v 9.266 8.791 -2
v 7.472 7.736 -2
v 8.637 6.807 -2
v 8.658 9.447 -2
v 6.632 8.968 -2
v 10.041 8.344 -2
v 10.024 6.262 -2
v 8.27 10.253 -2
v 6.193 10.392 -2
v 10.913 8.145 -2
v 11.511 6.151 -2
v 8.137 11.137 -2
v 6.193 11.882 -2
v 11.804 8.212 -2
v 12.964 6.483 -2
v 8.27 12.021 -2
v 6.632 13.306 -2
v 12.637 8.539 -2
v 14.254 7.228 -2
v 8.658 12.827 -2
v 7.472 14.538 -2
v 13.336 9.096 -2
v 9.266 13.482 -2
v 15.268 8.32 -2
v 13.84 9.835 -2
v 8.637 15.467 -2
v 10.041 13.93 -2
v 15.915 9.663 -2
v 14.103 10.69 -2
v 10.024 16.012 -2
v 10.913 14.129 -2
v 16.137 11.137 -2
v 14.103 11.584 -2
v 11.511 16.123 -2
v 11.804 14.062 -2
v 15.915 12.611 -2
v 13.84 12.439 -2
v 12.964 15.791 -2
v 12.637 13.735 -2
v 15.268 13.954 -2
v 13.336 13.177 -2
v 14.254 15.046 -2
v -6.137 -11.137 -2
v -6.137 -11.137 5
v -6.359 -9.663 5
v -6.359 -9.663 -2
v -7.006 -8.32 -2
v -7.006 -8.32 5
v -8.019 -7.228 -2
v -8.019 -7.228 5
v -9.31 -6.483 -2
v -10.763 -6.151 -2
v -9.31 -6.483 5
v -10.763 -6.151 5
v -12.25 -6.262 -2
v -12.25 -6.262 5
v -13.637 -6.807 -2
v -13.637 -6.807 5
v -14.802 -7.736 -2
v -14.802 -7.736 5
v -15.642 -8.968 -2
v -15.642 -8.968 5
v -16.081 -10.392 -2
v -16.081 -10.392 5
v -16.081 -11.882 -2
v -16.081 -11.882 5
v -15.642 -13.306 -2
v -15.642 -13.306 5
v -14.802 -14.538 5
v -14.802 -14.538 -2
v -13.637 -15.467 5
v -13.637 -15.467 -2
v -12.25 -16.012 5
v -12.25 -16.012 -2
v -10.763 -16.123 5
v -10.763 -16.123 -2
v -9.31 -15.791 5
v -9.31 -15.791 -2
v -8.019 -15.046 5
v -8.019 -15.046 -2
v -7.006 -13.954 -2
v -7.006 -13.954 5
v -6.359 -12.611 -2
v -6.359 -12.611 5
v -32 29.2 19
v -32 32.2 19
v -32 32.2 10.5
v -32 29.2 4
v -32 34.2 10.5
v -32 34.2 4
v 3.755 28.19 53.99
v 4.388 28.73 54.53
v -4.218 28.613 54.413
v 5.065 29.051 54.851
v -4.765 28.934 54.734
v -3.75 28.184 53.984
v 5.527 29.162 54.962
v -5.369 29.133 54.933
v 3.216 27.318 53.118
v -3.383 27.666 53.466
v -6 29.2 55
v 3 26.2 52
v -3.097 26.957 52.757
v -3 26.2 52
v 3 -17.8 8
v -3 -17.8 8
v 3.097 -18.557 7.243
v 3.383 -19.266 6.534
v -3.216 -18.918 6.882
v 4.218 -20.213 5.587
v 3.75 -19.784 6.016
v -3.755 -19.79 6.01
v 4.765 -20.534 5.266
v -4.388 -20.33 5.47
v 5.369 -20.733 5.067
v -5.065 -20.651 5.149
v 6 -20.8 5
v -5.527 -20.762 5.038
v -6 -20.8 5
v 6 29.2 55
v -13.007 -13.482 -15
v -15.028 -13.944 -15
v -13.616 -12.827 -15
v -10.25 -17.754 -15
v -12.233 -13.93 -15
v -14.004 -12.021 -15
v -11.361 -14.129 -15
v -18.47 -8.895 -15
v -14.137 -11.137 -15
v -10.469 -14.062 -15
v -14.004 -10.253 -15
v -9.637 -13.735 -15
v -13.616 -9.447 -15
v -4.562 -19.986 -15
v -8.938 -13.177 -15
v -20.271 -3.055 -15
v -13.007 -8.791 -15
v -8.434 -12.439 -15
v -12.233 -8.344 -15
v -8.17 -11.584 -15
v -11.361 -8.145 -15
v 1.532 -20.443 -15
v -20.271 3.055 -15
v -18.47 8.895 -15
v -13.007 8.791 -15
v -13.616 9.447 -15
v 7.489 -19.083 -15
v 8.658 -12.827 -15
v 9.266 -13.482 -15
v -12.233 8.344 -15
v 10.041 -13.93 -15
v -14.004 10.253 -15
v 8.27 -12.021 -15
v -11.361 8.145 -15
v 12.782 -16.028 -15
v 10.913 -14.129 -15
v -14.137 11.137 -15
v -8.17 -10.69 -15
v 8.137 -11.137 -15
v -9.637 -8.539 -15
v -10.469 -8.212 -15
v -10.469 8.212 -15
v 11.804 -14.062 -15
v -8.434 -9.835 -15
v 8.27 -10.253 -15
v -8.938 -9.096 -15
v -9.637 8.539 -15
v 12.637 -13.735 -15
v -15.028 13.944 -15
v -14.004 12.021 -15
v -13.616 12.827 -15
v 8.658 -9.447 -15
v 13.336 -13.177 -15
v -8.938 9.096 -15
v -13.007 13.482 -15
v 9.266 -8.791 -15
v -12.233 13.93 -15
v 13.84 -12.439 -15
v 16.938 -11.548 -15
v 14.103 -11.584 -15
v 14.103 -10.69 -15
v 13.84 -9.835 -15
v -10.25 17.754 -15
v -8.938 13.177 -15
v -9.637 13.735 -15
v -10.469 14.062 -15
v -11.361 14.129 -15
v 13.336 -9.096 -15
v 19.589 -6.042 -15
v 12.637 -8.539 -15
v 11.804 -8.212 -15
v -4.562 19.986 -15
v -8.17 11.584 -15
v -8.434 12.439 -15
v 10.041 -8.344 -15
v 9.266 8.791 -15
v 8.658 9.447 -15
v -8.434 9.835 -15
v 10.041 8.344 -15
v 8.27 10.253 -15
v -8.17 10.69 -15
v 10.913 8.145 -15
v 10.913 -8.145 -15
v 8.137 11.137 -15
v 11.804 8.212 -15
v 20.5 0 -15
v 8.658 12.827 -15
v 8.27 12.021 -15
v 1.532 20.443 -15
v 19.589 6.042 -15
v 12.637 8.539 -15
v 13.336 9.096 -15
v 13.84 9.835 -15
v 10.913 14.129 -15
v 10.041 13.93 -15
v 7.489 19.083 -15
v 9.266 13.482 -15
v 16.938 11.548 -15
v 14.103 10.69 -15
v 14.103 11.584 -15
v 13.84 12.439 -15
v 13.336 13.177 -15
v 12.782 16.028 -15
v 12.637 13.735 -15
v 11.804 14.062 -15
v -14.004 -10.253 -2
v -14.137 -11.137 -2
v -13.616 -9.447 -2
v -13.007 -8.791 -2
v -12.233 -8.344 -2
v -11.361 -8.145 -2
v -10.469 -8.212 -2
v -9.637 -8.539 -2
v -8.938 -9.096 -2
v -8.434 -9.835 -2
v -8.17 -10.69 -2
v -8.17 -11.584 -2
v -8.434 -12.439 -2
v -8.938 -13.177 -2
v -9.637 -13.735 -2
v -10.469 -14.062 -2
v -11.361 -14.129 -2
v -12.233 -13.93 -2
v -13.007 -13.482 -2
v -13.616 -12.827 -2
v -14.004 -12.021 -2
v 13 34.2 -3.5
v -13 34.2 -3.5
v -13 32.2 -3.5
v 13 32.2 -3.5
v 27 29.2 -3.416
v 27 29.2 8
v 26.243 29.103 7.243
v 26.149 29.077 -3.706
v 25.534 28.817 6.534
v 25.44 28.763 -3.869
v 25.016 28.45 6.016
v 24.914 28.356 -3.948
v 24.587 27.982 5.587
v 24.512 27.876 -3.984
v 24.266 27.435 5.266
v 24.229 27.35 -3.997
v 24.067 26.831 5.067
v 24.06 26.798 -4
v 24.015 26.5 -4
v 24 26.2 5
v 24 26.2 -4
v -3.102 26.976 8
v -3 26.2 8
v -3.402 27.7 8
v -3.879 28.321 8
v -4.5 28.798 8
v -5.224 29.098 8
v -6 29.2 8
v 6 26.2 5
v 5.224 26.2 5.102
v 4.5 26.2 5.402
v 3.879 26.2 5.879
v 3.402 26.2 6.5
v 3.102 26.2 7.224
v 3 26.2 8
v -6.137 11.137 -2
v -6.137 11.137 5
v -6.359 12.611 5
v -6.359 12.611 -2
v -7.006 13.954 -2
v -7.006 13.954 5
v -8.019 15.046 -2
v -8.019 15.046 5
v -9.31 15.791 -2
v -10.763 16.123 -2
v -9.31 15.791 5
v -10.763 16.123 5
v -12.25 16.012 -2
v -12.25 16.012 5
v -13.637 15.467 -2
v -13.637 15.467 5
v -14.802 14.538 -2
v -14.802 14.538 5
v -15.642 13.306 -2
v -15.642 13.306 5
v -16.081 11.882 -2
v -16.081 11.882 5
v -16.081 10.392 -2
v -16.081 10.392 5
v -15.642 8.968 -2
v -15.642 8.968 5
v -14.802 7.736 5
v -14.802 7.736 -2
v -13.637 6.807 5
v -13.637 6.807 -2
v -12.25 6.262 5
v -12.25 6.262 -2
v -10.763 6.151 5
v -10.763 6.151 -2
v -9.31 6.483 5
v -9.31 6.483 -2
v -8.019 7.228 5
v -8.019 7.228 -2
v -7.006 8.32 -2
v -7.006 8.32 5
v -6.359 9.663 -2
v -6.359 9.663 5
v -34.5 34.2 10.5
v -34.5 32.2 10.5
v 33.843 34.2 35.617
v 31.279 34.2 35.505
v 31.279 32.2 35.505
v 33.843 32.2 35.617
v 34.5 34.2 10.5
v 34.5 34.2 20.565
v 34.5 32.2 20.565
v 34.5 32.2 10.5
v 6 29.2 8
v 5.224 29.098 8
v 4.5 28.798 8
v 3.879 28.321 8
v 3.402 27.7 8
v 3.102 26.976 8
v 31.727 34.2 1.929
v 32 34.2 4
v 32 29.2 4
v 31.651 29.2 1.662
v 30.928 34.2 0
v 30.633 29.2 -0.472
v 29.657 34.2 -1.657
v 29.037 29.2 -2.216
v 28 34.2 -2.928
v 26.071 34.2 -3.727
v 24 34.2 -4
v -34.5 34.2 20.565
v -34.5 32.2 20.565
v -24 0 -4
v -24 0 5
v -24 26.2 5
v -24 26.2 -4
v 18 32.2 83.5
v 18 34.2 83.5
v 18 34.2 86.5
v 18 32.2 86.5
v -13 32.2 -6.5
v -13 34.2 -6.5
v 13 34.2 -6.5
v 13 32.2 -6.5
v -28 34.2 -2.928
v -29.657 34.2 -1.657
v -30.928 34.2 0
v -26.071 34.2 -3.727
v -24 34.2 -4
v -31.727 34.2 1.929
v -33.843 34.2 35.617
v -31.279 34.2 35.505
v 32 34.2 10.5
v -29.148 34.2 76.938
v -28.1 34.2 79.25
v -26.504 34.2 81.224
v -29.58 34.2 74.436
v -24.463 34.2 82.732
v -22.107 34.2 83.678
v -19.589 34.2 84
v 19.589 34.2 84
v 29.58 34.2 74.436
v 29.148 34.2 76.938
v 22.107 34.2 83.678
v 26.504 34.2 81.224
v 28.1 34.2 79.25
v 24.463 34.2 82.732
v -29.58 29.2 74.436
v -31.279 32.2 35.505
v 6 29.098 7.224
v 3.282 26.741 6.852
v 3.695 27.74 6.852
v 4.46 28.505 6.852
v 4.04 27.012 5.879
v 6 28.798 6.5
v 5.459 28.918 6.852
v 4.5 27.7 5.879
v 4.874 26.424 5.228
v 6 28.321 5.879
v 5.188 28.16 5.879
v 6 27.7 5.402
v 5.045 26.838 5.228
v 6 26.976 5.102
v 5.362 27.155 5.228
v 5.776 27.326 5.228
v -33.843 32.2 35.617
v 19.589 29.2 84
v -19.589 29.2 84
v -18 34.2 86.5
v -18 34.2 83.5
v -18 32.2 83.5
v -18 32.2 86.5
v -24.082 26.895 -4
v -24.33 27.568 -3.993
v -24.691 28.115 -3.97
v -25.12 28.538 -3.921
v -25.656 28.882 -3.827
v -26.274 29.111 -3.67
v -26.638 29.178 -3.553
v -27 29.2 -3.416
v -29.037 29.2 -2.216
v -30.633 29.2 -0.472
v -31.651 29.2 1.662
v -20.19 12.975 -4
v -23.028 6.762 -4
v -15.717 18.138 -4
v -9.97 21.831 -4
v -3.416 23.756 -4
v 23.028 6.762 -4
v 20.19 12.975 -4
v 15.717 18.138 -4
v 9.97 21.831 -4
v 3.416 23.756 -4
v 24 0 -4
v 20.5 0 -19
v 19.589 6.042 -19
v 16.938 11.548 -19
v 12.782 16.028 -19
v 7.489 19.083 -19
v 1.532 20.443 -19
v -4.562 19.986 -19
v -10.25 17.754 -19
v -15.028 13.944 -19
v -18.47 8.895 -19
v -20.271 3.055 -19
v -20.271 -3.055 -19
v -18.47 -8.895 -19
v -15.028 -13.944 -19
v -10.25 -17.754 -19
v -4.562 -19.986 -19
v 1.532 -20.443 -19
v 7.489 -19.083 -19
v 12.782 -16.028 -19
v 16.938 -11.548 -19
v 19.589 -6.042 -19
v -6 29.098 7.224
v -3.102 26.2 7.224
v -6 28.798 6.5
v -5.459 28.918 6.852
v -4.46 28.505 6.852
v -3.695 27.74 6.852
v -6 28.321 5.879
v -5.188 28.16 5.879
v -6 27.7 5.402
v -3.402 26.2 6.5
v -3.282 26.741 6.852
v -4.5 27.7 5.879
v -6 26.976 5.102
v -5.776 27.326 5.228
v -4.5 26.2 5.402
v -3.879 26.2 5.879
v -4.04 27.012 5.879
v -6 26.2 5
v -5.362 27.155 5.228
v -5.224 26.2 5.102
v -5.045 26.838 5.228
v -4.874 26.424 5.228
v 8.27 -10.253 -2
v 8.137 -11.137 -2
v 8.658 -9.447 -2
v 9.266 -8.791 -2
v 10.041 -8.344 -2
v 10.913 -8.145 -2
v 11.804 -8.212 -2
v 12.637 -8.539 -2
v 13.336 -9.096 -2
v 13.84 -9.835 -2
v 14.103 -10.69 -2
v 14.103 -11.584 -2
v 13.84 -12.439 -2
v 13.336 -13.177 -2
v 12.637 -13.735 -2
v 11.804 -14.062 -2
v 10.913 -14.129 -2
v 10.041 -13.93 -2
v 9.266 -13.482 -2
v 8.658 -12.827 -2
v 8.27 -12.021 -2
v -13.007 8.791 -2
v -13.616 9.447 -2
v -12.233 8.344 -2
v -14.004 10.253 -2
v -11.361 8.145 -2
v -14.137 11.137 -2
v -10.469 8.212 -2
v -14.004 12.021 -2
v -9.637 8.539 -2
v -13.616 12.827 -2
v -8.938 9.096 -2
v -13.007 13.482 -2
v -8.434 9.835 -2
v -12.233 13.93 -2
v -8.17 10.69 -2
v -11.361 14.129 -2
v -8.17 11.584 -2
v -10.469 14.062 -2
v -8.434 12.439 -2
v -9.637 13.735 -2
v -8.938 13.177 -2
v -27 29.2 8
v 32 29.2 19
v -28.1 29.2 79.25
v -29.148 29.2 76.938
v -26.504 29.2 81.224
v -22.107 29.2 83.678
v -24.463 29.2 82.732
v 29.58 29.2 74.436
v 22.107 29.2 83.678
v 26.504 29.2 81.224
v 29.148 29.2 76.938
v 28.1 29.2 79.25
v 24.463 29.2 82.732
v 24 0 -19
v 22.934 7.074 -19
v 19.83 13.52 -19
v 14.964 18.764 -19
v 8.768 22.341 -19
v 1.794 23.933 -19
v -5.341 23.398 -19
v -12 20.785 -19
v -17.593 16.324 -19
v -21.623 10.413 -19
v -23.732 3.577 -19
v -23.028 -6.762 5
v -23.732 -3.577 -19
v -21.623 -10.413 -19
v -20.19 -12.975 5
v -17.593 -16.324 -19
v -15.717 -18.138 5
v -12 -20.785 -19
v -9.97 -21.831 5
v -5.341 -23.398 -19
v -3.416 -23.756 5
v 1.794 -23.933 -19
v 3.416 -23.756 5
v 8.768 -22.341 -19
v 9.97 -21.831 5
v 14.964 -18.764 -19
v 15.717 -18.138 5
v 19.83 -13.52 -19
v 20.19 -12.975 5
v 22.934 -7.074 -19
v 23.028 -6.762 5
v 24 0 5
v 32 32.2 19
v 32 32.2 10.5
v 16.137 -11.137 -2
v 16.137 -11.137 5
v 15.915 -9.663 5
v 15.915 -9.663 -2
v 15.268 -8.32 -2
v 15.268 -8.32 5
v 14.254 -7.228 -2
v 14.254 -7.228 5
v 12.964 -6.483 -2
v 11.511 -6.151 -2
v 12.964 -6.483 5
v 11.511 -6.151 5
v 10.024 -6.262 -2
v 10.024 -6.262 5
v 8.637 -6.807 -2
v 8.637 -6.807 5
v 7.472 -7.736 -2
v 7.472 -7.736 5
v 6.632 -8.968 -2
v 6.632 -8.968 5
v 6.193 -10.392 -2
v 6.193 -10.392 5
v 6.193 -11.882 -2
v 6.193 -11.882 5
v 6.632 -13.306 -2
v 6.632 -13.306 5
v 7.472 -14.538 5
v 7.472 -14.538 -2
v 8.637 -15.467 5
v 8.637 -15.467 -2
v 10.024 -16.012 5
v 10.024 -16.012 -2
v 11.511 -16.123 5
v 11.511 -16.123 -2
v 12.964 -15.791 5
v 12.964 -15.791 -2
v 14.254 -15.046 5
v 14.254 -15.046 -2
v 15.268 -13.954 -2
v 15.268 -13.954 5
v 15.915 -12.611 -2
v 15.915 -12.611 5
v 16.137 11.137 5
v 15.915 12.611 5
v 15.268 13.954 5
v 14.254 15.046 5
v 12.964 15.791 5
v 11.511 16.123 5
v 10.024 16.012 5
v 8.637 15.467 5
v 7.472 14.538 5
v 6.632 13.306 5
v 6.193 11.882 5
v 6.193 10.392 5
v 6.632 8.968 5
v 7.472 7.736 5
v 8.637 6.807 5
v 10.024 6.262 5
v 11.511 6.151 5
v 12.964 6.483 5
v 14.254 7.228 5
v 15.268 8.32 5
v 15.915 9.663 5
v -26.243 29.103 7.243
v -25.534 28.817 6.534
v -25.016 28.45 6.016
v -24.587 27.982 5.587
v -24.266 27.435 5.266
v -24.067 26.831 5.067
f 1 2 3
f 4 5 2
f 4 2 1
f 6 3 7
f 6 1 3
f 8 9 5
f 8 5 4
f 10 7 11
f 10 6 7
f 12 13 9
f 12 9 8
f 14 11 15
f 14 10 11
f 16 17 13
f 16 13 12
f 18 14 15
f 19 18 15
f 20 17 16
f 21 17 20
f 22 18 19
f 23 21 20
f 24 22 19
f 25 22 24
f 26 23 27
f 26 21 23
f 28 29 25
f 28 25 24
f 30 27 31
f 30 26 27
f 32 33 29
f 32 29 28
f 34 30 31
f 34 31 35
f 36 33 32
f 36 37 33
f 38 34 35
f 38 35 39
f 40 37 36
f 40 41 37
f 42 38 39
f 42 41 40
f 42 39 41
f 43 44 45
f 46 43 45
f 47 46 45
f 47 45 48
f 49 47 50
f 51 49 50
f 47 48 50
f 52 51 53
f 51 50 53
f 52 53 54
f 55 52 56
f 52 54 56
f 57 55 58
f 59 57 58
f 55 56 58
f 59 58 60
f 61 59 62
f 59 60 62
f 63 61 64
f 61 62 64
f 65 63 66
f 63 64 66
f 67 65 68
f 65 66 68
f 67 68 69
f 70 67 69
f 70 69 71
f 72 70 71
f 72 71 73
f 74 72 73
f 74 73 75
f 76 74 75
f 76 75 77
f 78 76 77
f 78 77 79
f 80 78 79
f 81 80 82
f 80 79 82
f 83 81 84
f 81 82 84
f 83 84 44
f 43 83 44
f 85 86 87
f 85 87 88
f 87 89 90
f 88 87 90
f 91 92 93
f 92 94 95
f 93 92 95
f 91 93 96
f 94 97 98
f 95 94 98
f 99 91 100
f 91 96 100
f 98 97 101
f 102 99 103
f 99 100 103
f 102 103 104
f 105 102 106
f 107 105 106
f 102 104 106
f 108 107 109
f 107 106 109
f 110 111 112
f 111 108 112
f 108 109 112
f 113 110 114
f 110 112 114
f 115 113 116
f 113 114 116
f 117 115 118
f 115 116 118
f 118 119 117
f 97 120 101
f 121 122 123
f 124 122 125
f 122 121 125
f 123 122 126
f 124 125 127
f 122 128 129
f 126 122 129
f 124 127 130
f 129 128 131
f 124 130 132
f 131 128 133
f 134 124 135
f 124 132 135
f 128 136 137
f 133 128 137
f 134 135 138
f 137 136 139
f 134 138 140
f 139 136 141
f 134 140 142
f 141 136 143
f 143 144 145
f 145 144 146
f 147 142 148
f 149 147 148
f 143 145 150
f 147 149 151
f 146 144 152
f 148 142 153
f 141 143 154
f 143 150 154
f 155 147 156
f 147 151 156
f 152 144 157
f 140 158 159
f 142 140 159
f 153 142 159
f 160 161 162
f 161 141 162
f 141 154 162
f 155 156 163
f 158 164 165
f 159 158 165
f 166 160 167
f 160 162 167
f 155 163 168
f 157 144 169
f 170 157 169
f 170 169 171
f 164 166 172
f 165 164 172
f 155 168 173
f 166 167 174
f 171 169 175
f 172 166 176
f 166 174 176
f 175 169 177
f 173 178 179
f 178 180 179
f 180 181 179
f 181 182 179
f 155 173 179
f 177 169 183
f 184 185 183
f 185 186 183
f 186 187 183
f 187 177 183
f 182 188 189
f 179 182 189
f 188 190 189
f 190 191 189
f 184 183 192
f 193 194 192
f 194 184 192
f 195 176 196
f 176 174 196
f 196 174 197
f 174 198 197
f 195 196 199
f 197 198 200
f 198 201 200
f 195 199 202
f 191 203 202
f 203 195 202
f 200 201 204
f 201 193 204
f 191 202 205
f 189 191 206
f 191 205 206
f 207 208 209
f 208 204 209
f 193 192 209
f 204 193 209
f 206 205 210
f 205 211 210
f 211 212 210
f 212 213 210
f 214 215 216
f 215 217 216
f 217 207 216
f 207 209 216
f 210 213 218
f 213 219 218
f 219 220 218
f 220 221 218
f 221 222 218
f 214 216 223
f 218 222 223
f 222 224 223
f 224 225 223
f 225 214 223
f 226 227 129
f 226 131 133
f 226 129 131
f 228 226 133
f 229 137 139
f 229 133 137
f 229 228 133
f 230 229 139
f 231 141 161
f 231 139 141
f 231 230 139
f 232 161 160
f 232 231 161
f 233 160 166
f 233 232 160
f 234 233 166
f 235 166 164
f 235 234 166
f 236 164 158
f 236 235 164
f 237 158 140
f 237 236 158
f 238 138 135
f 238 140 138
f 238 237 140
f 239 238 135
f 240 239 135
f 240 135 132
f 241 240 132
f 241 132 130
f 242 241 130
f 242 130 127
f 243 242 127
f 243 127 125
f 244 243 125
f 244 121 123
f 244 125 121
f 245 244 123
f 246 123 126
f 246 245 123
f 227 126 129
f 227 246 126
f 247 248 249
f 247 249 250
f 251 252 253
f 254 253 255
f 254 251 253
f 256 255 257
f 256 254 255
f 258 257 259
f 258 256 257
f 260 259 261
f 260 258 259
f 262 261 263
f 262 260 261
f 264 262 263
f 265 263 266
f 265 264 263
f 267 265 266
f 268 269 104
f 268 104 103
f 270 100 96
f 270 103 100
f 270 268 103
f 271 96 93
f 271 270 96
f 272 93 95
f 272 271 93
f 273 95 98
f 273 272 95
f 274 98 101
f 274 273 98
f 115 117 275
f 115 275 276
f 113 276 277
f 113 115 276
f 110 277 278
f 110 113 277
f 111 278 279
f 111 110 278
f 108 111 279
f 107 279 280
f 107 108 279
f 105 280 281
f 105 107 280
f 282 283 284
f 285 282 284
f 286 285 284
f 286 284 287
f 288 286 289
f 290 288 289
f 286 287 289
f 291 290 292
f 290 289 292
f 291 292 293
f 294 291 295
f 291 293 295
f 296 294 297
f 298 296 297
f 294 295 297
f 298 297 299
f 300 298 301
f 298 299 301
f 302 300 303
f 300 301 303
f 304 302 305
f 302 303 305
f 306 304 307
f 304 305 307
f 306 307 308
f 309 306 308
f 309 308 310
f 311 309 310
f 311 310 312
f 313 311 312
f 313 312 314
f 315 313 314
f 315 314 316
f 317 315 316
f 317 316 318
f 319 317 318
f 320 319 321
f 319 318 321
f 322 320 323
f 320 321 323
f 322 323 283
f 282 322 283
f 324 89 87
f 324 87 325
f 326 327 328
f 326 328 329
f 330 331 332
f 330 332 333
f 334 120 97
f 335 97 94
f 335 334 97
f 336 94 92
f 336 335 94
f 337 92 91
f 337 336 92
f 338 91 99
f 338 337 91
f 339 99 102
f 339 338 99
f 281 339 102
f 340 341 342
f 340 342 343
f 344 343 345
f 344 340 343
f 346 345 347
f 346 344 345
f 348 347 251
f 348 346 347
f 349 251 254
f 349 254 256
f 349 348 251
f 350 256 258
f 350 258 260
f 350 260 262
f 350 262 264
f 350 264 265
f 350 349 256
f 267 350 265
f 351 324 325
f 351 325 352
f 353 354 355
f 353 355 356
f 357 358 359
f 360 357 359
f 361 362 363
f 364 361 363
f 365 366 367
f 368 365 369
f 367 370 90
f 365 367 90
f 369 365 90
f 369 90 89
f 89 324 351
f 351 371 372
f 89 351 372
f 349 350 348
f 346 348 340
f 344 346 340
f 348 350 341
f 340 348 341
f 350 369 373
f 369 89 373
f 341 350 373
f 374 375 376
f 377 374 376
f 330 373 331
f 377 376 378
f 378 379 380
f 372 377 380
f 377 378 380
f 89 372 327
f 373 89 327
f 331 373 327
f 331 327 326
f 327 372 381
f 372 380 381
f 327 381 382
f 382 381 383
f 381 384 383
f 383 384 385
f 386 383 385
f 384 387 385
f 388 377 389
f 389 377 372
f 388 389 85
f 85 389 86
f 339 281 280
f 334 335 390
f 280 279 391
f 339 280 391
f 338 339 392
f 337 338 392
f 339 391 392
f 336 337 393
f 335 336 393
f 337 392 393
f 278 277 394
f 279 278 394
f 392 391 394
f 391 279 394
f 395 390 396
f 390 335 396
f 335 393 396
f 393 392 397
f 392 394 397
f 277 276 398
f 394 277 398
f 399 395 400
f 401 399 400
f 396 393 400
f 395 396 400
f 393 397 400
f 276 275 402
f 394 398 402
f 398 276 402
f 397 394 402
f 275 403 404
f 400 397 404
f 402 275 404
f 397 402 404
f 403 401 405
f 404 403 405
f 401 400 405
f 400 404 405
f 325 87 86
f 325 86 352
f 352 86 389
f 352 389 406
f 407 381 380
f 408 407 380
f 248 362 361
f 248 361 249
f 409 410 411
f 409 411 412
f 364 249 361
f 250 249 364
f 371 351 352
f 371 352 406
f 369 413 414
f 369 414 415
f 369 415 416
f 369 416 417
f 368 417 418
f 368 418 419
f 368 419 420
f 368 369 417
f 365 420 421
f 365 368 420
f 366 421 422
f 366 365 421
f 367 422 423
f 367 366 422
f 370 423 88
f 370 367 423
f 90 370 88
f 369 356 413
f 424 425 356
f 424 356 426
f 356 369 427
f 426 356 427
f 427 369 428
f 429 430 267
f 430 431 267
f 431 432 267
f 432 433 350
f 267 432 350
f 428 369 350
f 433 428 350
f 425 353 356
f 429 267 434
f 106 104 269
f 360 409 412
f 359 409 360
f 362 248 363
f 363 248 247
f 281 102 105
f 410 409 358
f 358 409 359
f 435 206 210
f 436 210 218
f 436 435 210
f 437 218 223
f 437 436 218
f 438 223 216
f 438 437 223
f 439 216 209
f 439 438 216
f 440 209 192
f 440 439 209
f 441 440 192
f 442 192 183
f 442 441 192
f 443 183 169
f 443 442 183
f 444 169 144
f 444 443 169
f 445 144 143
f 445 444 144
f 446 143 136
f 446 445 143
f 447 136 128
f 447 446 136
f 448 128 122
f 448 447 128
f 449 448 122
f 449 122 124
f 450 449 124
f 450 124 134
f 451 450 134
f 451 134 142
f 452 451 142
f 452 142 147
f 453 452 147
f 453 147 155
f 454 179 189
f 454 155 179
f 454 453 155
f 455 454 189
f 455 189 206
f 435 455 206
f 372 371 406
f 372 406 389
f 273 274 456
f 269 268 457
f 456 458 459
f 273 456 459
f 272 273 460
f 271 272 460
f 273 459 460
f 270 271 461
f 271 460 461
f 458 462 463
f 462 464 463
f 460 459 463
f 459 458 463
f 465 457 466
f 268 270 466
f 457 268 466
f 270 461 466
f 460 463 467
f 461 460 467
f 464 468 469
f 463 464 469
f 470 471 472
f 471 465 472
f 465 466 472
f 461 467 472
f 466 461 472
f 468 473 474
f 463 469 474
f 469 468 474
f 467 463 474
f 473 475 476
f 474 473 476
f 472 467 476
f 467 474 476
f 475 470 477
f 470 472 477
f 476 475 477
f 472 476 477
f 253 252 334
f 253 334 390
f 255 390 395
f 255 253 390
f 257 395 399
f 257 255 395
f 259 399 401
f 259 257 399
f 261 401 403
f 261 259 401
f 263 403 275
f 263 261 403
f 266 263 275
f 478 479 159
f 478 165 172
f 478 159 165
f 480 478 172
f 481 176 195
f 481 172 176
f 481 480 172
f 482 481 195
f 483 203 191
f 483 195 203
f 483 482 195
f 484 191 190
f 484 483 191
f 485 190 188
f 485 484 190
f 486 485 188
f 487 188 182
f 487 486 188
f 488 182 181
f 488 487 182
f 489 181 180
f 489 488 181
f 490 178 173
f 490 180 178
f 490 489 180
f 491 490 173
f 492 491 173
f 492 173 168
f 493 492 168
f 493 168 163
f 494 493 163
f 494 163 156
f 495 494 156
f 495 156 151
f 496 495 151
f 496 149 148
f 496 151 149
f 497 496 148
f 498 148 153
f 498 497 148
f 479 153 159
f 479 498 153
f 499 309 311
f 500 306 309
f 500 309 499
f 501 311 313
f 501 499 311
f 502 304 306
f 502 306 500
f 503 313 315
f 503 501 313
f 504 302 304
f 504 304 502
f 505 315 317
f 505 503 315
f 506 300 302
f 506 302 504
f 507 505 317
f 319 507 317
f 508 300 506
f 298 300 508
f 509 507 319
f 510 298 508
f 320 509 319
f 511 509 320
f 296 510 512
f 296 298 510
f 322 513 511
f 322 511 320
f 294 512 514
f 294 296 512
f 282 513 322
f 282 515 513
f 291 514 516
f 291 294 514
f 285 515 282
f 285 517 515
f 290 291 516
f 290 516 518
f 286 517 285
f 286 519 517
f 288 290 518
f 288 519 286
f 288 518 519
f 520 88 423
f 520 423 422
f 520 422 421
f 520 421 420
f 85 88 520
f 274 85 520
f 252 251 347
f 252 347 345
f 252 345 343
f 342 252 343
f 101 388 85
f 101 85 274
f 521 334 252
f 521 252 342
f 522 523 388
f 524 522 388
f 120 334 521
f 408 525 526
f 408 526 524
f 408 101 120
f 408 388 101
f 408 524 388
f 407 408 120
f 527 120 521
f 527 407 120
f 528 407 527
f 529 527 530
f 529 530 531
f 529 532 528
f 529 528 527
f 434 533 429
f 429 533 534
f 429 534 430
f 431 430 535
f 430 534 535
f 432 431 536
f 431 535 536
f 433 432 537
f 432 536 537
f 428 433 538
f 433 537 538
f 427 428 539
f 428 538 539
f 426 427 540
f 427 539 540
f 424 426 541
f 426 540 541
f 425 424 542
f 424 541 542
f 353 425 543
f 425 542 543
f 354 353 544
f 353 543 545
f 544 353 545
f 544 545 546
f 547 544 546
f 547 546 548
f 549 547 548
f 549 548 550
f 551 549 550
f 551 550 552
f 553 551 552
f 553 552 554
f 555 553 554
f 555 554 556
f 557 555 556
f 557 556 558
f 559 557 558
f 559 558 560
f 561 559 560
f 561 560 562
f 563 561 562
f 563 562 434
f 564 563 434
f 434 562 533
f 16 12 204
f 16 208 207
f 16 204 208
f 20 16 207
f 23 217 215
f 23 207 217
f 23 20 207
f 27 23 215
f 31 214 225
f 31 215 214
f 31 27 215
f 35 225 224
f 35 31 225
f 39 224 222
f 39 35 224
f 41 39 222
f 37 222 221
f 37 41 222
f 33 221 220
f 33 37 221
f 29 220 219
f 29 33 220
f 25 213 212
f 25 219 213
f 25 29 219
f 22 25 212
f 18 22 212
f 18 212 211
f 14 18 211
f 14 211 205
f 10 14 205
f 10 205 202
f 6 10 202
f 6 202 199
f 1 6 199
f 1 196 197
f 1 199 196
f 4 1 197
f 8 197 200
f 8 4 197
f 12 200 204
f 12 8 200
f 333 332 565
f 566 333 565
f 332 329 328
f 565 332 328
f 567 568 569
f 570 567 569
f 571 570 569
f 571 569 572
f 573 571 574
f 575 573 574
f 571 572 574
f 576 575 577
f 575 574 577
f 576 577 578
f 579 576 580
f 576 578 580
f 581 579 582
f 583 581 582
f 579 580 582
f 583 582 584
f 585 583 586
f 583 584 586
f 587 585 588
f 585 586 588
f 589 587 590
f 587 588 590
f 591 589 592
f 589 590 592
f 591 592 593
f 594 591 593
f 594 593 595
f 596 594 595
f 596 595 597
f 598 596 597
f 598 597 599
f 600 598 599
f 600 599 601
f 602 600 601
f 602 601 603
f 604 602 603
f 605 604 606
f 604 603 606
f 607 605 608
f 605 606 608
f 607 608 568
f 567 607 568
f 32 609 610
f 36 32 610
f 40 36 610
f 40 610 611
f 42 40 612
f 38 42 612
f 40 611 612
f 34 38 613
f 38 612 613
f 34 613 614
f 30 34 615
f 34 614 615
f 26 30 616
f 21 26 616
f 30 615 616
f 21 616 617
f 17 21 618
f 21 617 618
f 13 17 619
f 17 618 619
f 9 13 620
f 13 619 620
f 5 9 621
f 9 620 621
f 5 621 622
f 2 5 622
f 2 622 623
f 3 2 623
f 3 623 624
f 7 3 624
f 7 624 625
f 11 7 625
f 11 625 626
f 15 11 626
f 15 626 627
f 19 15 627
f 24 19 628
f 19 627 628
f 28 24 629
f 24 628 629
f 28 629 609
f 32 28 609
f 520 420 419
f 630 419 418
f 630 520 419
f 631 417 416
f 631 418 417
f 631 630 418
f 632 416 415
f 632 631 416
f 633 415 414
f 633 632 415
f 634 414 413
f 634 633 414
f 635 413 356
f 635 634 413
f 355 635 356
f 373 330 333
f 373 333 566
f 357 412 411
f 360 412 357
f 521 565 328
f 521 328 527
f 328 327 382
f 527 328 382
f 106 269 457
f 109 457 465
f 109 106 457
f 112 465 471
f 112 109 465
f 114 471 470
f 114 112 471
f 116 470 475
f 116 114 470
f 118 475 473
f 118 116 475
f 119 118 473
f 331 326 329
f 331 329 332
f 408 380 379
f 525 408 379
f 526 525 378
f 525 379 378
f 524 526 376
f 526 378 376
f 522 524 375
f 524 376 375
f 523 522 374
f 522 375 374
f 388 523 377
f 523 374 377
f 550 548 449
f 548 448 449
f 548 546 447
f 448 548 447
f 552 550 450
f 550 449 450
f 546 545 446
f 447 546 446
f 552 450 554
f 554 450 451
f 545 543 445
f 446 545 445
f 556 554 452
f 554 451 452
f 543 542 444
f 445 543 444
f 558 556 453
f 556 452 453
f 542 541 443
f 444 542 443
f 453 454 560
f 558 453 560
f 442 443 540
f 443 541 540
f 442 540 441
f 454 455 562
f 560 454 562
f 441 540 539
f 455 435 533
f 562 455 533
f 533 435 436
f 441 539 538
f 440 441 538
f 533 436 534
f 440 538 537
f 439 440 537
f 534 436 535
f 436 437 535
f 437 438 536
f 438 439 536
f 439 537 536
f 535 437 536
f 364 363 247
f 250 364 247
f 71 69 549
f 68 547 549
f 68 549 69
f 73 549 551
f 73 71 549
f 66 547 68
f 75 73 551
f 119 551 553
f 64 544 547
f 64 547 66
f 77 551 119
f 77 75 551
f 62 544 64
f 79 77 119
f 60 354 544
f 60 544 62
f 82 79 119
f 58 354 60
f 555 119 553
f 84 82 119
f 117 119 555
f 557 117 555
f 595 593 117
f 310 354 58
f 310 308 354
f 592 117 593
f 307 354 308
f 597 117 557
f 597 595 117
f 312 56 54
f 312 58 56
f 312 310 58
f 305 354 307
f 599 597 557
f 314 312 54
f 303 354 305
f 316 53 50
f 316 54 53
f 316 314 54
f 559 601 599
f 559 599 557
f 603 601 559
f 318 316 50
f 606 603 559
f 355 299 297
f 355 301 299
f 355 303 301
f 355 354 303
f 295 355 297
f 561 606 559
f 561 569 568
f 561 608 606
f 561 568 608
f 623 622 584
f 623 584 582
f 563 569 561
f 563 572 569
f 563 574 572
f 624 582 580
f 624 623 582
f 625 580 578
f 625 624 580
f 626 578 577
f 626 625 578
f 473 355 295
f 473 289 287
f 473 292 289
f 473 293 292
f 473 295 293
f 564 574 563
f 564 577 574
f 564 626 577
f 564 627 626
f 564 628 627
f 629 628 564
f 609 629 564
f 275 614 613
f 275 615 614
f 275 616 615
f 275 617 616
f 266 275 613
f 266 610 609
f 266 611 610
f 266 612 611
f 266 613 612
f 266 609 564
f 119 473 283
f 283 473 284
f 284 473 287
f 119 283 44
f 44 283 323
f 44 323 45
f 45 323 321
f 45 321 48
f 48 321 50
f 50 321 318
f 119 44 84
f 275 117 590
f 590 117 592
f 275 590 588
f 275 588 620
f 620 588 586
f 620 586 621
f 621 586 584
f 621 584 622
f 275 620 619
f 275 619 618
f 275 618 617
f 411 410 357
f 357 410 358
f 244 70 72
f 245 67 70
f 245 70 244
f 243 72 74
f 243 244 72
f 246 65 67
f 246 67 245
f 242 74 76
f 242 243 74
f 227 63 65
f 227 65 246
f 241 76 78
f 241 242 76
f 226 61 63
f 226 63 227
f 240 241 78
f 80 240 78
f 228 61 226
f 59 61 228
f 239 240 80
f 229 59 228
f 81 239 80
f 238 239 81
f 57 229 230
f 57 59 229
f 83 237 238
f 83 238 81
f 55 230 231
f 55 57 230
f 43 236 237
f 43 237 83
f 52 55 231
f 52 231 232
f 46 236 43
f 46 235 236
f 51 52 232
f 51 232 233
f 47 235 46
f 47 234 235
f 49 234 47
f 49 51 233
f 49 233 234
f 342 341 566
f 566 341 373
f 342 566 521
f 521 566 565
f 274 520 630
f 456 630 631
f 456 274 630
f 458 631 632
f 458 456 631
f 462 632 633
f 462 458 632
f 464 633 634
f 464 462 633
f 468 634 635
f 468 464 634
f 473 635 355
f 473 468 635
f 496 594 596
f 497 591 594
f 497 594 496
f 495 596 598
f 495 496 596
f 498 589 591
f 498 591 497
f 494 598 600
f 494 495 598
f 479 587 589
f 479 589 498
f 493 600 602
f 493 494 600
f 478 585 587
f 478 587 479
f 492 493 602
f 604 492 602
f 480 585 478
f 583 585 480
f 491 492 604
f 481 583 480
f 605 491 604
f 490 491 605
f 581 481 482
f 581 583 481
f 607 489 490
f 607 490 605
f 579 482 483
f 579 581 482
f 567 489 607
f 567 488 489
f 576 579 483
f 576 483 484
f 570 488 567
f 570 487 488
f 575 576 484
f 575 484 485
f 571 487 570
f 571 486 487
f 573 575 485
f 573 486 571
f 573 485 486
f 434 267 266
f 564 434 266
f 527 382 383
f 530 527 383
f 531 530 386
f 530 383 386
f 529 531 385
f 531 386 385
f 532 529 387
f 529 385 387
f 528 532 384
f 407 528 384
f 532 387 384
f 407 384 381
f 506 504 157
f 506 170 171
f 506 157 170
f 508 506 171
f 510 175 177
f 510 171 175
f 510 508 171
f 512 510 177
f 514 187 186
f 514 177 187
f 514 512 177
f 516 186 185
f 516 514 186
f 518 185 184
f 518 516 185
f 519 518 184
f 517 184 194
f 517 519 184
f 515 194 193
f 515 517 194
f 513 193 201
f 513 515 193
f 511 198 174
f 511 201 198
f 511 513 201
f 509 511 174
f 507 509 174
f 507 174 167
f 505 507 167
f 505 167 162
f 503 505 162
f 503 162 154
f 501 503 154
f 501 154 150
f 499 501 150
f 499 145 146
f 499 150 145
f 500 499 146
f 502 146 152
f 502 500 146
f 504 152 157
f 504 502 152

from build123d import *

# Parameters (mm, degrees)
BOSS_EXTRUDE3_DEPTH      = 5
BOSS_EXTRUDE3_DEPTH_BACK = 15
SKETCH1_R                = 24
SKETCH1_R_2              = 20.5
BOSS_EXTRUDE4_DEPTH      = 5
BOSS_EXTRUDE4_DEPTH_BACK = 19
SKETCH1_5_R              = 24
SKETCH1_5_R_2            = 20.5
CUT_EXTRUDE1_DEPTH       = 40.395431207
CUT_EXTRUDE1_DEPTH_BACK  = 40.395431207
SKETCH3_R                = 3
SKETCH7_W                = 36
SKETCH7_H                = 3
BOSS_EXTRUDE6_DEPTH      = 2
SKETCH7_W_2              = 26
BOSS_EXTRUDE6_2_DEPTH    = 2
BOSS_EXTRUDE6_3_DEPTH    = 2
BOSS_EXTRUDE6_4_DEPTH    = 2
BOSS_EXTRUDE7_DEPTH      = 5
BOSS_EXTRUDE8_REACH      = 109.251
BOSS_EXTRUDE8_END_RADIUS = 24
SKETCH8_W                = 48
SKETCH8_H                = 9
BOSS_EXTRUDE9_DEPTH      = 3
BOSS_EXTRUDE9_DEPTH_BACK = 3
FILLET1_R                = 3
SKETCH11_R               = 5
CUT_EXTRUDE3_DEPTH       = 7


with BuildPart() as part:
    # Sketch1 → Boss-Extrude3 (new, two sides: drawn at the far end of the back side and taken through both)
    # profile 1 of 2: a face of its own
    with BuildSketch(Plane.XY.offset(-BOSS_EXTRUDE3_DEPTH_BACK)):
        Circle(SKETCH1_R)
        Circle(SKETCH1_R_2, mode=Mode.SUBTRACT)
    # profile 2 of 2: a face of its own
    with BuildSketch(Plane.XY.offset(-BOSS_EXTRUDE3_DEPTH_BACK)):
        Circle(SKETCH1_R_2)
    extrude(amount=BOSS_EXTRUDE3_DEPTH + BOSS_EXTRUDE3_DEPTH_BACK)

    # Sketch1<5> → Boss-Extrude4 (add, two sides: drawn at the far end of the back side and taken through both)
    with BuildSketch(Plane.XY.offset(-BOSS_EXTRUDE4_DEPTH_BACK)):
        Circle(SKETCH1_5_R)
        Circle(SKETCH1_5_R_2, mode=Mode.SUBTRACT)
    extrude(amount=BOSS_EXTRUDE4_DEPTH + BOSS_EXTRUDE4_DEPTH_BACK)

    # Sketch3 → Cut-Extrude1 (cut, two sides: drawn at the far end of the back side and taken through both)
    with BuildSketch(Plane(origin=(0, 0, -15), x_dir=(-1, 0, 0), z_dir=(0, 0, -1)).offset(-CUT_EXTRUDE1_DEPTH_BACK)):
        with Locations((11.136931804, 11.136931804)):
            Circle(SKETCH3_R)
        with Locations((11.136931804, -11.136931804)):
            Circle(SKETCH3_R)
        with Locations((-11.136931804, -11.136931804)):
            Circle(SKETCH3_R)
        with Locations((-11.136931804, 11.136931804)):
            Circle(SKETCH3_R)
    extrude(amount=CUT_EXTRUDE1_DEPTH + CUT_EXTRUDE1_DEPTH_BACK, mode=Mode.SUBTRACT)



with BuildPart() as body_2:
    # Sketch7 → Boss-Extrude6 (new body)
    with BuildSketch(Plane(origin=(0, 34.2, -5.3), x_dir=(1, 0, 0), z_dir=(0, -1, 0))):
        with Locations((0, 90.3)):
            Rectangle(SKETCH7_W, SKETCH7_H)
    extrude(amount=BOSS_EXTRUDE6_DEPTH)


with BuildPart() as body_3:
    # Sketch7 → Boss-Extrude6 2 (new body)
    with BuildSketch(Plane(origin=(0, 34.2, -5.3), x_dir=(1, 0, 0), z_dir=(0, -1, 0))):
        with Locations((0, 0.3)):
            Rectangle(SKETCH7_W_2, SKETCH7_H)
    extrude(amount=BOSS_EXTRUDE6_2_DEPTH)


with BuildPart() as body_4:
    # Sketch7 → Boss-Extrude6 3 (new body)
    with BuildSketch(Plane(origin=(0, 34.2, -5.3), x_dir=(1, 0, 0), z_dir=(0, -1, 0))):
        Polygon((31.5, 25.8), (30.84570919, 40.785723324), (33.842853854, 40.916581486), (34.5, 25.865460233), (34.5, 15.8), (31.5, 15.8), align=None)
    extrude(amount=BOSS_EXTRUDE6_3_DEPTH)



with BuildPart() as body_5:
    # Sketch7 → Boss-Extrude6 4 (new body)
    with BuildSketch(Plane(origin=(0, 34.2, -5.3), x_dir=(1, 0, 0), z_dir=(0, -1, 0))):
        Polygon((-31.5, 25.8), (-31.5, 15.8), (-34.5, 15.8), (-34.5, 25.865460233), (-33.842853854, 40.916581486), (-30.84570919, 40.785723324), align=None)
    extrude(amount=BOSS_EXTRUDE6_4_DEPTH)


with BuildPart() as body_4_1:
    add(body_4.part)

    add(body_5.part)  # Boss-Extrude7 merges body 5
    # Sketch6 → Boss-Extrude7 (add)
    with BuildSketch(Plane(origin=(0, 34.2, 4.7), x_dir=(1, 0, 0), z_dir=(0, -1, 0))):
        with BuildLine():
            Line((32, -0.7), (32, 14.3))
            Line((32, 14.3), (29.579603504, 69.736193874))
            ThreePointArc((29.579603504, 69.736193874), (26.504251846, 76.523639621), (19.589121288, 79.3))
            Line((19.589121288, 79.3), (-19.589121288, 79.3))
            ThreePointArc((-19.589121288, 79.3), (-26.504251846, 76.523639621), (-29.579603504, 69.736193874))
            Line((-29.579603504, 69.736193874), (-32, 14.3))
            Line((-32, 14.3), (-32, -0.7))
            ThreePointArc((-32, -0.7), (-29.656854249, -6.356854249), (-24, -8.7))
            Line((-24, -8.7), (24, -8.7))
            ThreePointArc((24, -8.7), (29.656854249, -6.356854249), (32, -0.7))
        make_face()
    extrude(amount=BOSS_EXTRUDE7_DEPTH)


with BuildPart() as part_1:
    add(part.part)

    add(body_4_1.part)  # Boss-Extrude8 merges body 4
    # Boss-Extrude8: up to this cylinder (the profile starts outside it)
    boss_extrude8_end = Plane(origin=(0, 0, 0.5), z_dir=(0, 0, 1)) * Cylinder(BOSS_EXTRUDE8_END_RADIUS, 267.502, mode=Mode.PRIVATE)
    # Sketch8 → Boss-Extrude8 (add, up to the surface)
    with BuildSketch(Plane.XZ.offset(-29.2), mode=Mode.PRIVATE) as boss_extrude8_sk1:
        with Locations((0, 0.5)):
            Rectangle(SKETCH8_W, SKETCH8_H)
    boss_extrude8_tool1 = extrude(boss_extrude8_sk1.sketch, amount=BOSS_EXTRUDE8_REACH, mode=Mode.PRIVATE) - boss_extrude8_end
    add(boss_extrude8_tool1.solids().sort_by_distance((0, 29.2, 0.5))[0])

    # Sketch9 → Boss-Extrude9 (add, two sides: drawn at the far end of the back side and taken through both)
    with BuildSketch(Plane(origin=(0, 0, 0), x_dir=(0, 0, -1), z_dir=(1, 0, 0)).offset(-BOSS_EXTRUDE9_DEPTH_BACK)):
        Polygon((-5, 29.2), (-55, 29.2), (-5, -20.8), align=None)
    extrude(amount=BOSS_EXTRUDE9_DEPTH + BOSS_EXTRUDE9_DEPTH_BACK)

    # Fillet1
    # the kernel refuses this fillet: 3 mm, written as the material it adds along each edge
    with BuildSketch(Plane(origin=(-6, 26.2, 8), x_dir=(1, 0, 0), z_dir=(0, 0, -1))) as fillet1_piece_1_section:
        Polygon((0, 0), (FILLET1_R * 1.02, 0), (FILLET1_R * 1.02, -FILLET1_R * 1.02), (0, -FILLET1_R * 1.02), align=None)
    fillet1_piece_1 = extrude(amount=FILLET1_R * 1.02, mode=Mode.PRIVATE)
    fillet1_piece_1 = fillet1_piece_1 - Plane(origin=(-6, 26.2, 8), x_dir=(-0.7071067811865475, -0.7071067811865475, 0), z_dir=(0, 0, -1)) * Sphere(FILLET1_R, mode=Mode.PRIVATE)
    add(fillet1_piece_1)
    with BuildSketch(Plane(origin=(6, 26.2, 8), x_dir=(-1, 0, 0), z_dir=(0, 0, -1))) as fillet1_piece_2_section:
        Polygon((0, 0), (FILLET1_R * 1.02, 0), (FILLET1_R * 1.02, FILLET1_R * 1.02), (0, FILLET1_R * 1.02), align=None)
    fillet1_piece_2 = extrude(amount=FILLET1_R * 1.02, mode=Mode.PRIVATE)
    fillet1_piece_2 = fillet1_piece_2 - Plane(origin=(6, 26.2, 8), x_dir=(0.7071067811865475, -0.7071067811865475, 0), z_dir=(0, 0, -1)) * Sphere(FILLET1_R, mode=Mode.PRIVATE)
    add(fillet1_piece_2)
    with BuildSketch(Plane(origin=(-6, 29.2, 5), x_dir=(0, 0, 1), z_dir=(-1, 0, 0)), Plane(origin=(24, 29.2, 5), x_dir=(0, 0, 1), z_dir=(-1, 0, 0))) as fillet1_piece_3:
        with BuildLine():
            CenterArc((FILLET1_R, -FILLET1_R), FILLET1_R, 90, 90)
            Line((0, -FILLET1_R), (-FILLET1_R * 0.02, -FILLET1_R))
            Line((-FILLET1_R * 0.02, -FILLET1_R), (-FILLET1_R * 0.02, FILLET1_R * 0.02))
            Line((-FILLET1_R * 0.02, FILLET1_R * 0.02), (FILLET1_R, FILLET1_R * 0.02))
            Line((FILLET1_R, FILLET1_R * 0.02), (FILLET1_R, 0))
        make_face()
    extrude(amount=18)
    with BuildSketch(Plane(origin=(24, 29.2, -4), x_dir=(0, -1, 0), z_dir=(0, 0, 1))) as fillet1_piece_4_section:
        with BuildLine():
            CenterArc((FILLET1_R, FILLET1_R), FILLET1_R, 180, 90)
            Line((0, FILLET1_R), (-FILLET1_R * 0.02, FILLET1_R))
            Line((-FILLET1_R * 0.02, FILLET1_R), (-FILLET1_R * 0.02, -FILLET1_R * 0.02))
            Line((-FILLET1_R * 0.02, -FILLET1_R * 0.02), (FILLET1_R, -FILLET1_R * 0.02))
            Line((FILLET1_R, -FILLET1_R * 0.02), (FILLET1_R, 0))
        make_face()
    fillet1_piece_4 = extrude(amount=9, mode=Mode.PRIVATE)
    fillet1_piece_4 = fillet1_piece_4 & Plane(origin=(24, 28.51771495, 4), x_dir=(0, 0, -1), z_dir=(0, 1, 0)) * Cylinder(8, 30, mode=Mode.PRIVATE)
    add(fillet1_piece_4)
    with BuildSketch(Plane(origin=(-24, 29.2, 5), x_dir=(0, -1, 0), z_dir=(0, 0, -1))) as fillet1_piece_5_section:
        with BuildLine():
            CenterArc((FILLET1_R, FILLET1_R), FILLET1_R, 180, 90)
            Line((0, FILLET1_R), (-FILLET1_R * 0.02, FILLET1_R))
            Line((-FILLET1_R * 0.02, FILLET1_R), (-FILLET1_R * 0.02, -FILLET1_R * 0.02))
            Line((-FILLET1_R * 0.02, -FILLET1_R * 0.02), (FILLET1_R, -FILLET1_R * 0.02))
            Line((FILLET1_R, -FILLET1_R * 0.02), (FILLET1_R, 0))
        make_face()
    fillet1_piece_5 = extrude(amount=9, mode=Mode.PRIVATE)
    fillet1_piece_5 = fillet1_piece_5 & Plane(origin=(-24, 28.517715039, 4), x_dir=(-1, 0, 0), z_dir=(0, 1, 0)) * Cylinder(8, 30, mode=Mode.PRIVATE)
    add(fillet1_piece_5)
    with BuildSketch(Plane(origin=(-3, -28.3, 5), x_dir=(-1, 0, 0), z_dir=(0, 1, 0))) as fillet1_piece_6_section:
        with BuildLine():
            CenterArc((FILLET1_R, FILLET1_R), FILLET1_R, 180, 90)
            Line((0, FILLET1_R), (-FILLET1_R * 0.02, FILLET1_R))
            Line((-FILLET1_R * 0.02, FILLET1_R), (-FILLET1_R * 0.02, -FILLET1_R * 0.02))
            Line((-FILLET1_R * 0.02, -FILLET1_R * 0.02), (FILLET1_R, -FILLET1_R * 0.02))
            Line((FILLET1_R, -FILLET1_R * 0.02), (FILLET1_R, 0))
        make_face()
    fillet1_piece_6 = extrude(amount=54.5, mode=Mode.PRIVATE)
    fillet1_piece_6 = split(fillet1_piece_6, bisect_by=Plane(origin=(-3.684520102, -8.5473837, 17.2526163), z_dir=(0, 0.7071067811865475, -0.7071067811865476)), keep=Keep.TOP, mode=Mode.PRIVATE)
    add(fillet1_piece_6)
    with BuildSketch(Plane(origin=(-3, 29.2, 8), x_dir=(-1, 0, 0), z_dir=(0, 0, 1))) as fillet1_piece_7_section:
        with BuildLine():
            CenterArc((FILLET1_R, FILLET1_R), FILLET1_R, 180, 90)
            Line((0, FILLET1_R), (-FILLET1_R * 0.02, FILLET1_R))
            Line((-FILLET1_R * 0.02, FILLET1_R), (-FILLET1_R * 0.02, -FILLET1_R * 0.02))
            Line((-FILLET1_R * 0.02, -FILLET1_R * 0.02), (FILLET1_R, -FILLET1_R * 0.02))
            Line((FILLET1_R, -FILLET1_R * 0.02), (FILLET1_R, 0))
        make_face()
    fillet1_piece_7 = extrude(amount=54.5, mode=Mode.PRIVATE)
    fillet1_piece_7 = split(fillet1_piece_7, bisect_by=Plane(origin=(-3.684520102, 16.9473837, 42.7473837), z_dir=(0, 0.7071067811865475, -0.7071067811865476)), keep=Keep.TOP, mode=Mode.PRIVATE)
    add(fillet1_piece_7)
    with BuildSketch(Plane(origin=(3, -28.3, 5), x_dir=(1, 0, 0), z_dir=(0, 1, 0))) as fillet1_piece_8_section:
        with BuildLine():
            CenterArc((FILLET1_R, -FILLET1_R), FILLET1_R, 90, 90)
            Line((0, -FILLET1_R), (-FILLET1_R * 0.02, -FILLET1_R))
            Line((-FILLET1_R * 0.02, -FILLET1_R), (-FILLET1_R * 0.02, FILLET1_R * 0.02))
            Line((-FILLET1_R * 0.02, FILLET1_R * 0.02), (FILLET1_R, FILLET1_R * 0.02))
            Line((FILLET1_R, FILLET1_R * 0.02), (FILLET1_R, 0))
        make_face()
    fillet1_piece_8 = extrude(amount=54.5, mode=Mode.PRIVATE)
    fillet1_piece_8 = split(fillet1_piece_8, bisect_by=Plane(origin=(3.684520102, -8.5473837, 17.2526163), z_dir=(0, 0.7071067811865475, -0.7071067811865476)), keep=Keep.TOP, mode=Mode.PRIVATE)
    add(fillet1_piece_8)
    with BuildSketch(Plane(origin=(3, 29.2, 8), x_dir=(1, 0, 0), z_dir=(0, 0, 1))) as fillet1_piece_9_section:
        with BuildLine():
            CenterArc((FILLET1_R, -FILLET1_R), FILLET1_R, 90, 90)
            Line((0, -FILLET1_R), (-FILLET1_R * 0.02, -FILLET1_R))
            Line((-FILLET1_R * 0.02, -FILLET1_R), (-FILLET1_R * 0.02, FILLET1_R * 0.02))
            Line((-FILLET1_R * 0.02, FILLET1_R * 0.02), (FILLET1_R, FILLET1_R * 0.02))
            Line((FILLET1_R, FILLET1_R * 0.02), (FILLET1_R, 0))
        make_face()
    fillet1_piece_9 = extrude(amount=54.5, mode=Mode.PRIVATE)
    fillet1_piece_9 = split(fillet1_piece_9, bisect_by=Plane(origin=(3.684520102, 16.9473837, 42.7473837), z_dir=(0, 0.7071067811865475, -0.7071067811865476)), keep=Keep.TOP, mode=Mode.PRIVATE)
    add(fillet1_piece_9)
    with BuildSketch(Plane(origin=(-24, 29.2, 12.5), x_dir=(0, -1, 0), z_dir=(0, 0, -1))) as fillet1_piece_10a_section:
        with BuildLine():
            CenterArc((FILLET1_R, FILLET1_R), FILLET1_R, 180, 90)
            Line((0, FILLET1_R), (-FILLET1_R * 0.02, FILLET1_R))
            Line((-FILLET1_R * 0.02, FILLET1_R), (-FILLET1_R * 0.02, -FILLET1_R * 0.02))
            Line((-FILLET1_R * 0.02, -FILLET1_R * 0.02), (FILLET1_R, -FILLET1_R * 0.02))
            Line((FILLET1_R, -FILLET1_R * 0.02), (FILLET1_R, 0))
        make_face()
    fillet1_piece_10a = extrude(amount=16.5, mode=Mode.PRIVATE)
    fillet1_piece_10a = fillet1_piece_10a & Plane(origin=(-24, 28.516822216, 4), x_dir=(-1, 0, 0), z_dir=(0, 1, 0)) * Cylinder(8, 45, mode=Mode.PRIVATE)
    fillet1_piece_10a = split(fillet1_piece_10a, bisect_by=Plane(origin=(-24.671174744, 28.516822216, 5), z_dir=(0, 0, 1)), keep=Keep.TOP, mode=Mode.PRIVATE)
    with BuildSketch(Plane(origin=(-6, 29.2, 5), x_dir=(0, 0, 1), z_dir=(-1, 0, 0))) as fillet1_piece_10b_section:
        with BuildLine():
            CenterArc((FILLET1_R, -FILLET1_R), FILLET1_R, 90, 90)
            Line((0, -FILLET1_R), (-FILLET1_R * 0.02, -FILLET1_R))
            Line((-FILLET1_R * 0.02, -FILLET1_R), (-FILLET1_R * 0.02, FILLET1_R * 0.02))
            Line((-FILLET1_R * 0.02, FILLET1_R * 0.02), (FILLET1_R, FILLET1_R * 0.02))
            Line((FILLET1_R, FILLET1_R * 0.02), (FILLET1_R, 0))
        make_face()
    fillet1_piece_10b = extrude(amount=25.5, mode=Mode.PRIVATE)
    fillet1_piece_10b = split(fillet1_piece_10b, bisect_by=Plane(origin=(-24, 28.520814657, 5.679185343), z_dir=(-1, 0, 0)), keep=Keep.TOP, mode=Mode.PRIVATE)
    fillet1_piece_10 = fillet1_piece_10a & fillet1_piece_10b
    add(fillet1_piece_10)
    with BuildSketch(Plane(origin=(24, 29.2, -4), x_dir=(0, -1, 0), z_dir=(0, 0, 1))) as fillet1_piece_11a_section:
        with BuildLine():
            CenterArc((FILLET1_R, FILLET1_R), FILLET1_R, 180, 90)
            Line((0, FILLET1_R), (-FILLET1_R * 0.02, FILLET1_R))
            Line((-FILLET1_R * 0.02, FILLET1_R), (-FILLET1_R * 0.02, -FILLET1_R * 0.02))
            Line((-FILLET1_R * 0.02, -FILLET1_R * 0.02), (FILLET1_R, -FILLET1_R * 0.02))
            Line((FILLET1_R, -FILLET1_R * 0.02), (FILLET1_R, 0))
        make_face()
    fillet1_piece_11a = extrude(amount=16.5, mode=Mode.PRIVATE)
    fillet1_piece_11a = fillet1_piece_11a & Plane(origin=(24, 28.516822319, 4), x_dir=(0, 0, -1), z_dir=(0, 1, 0)) * Cylinder(8, 45, mode=Mode.PRIVATE)
    fillet1_piece_11a = split(fillet1_piece_11a, bisect_by=Plane(origin=(24.671175029, 28.516822319, 5), z_dir=(0, 0, 1)), keep=Keep.TOP, mode=Mode.PRIVATE)
    with BuildSketch(Plane(origin=(31.5, 29.2, 5), x_dir=(0, 0, 1), z_dir=(-1, 0, 0))) as fillet1_piece_11b_section:
        with BuildLine():
            CenterArc((FILLET1_R, -FILLET1_R), FILLET1_R, 90, 90)
            Line((0, -FILLET1_R), (-FILLET1_R * 0.02, -FILLET1_R))
            Line((-FILLET1_R * 0.02, -FILLET1_R), (-FILLET1_R * 0.02, FILLET1_R * 0.02))
            Line((-FILLET1_R * 0.02, FILLET1_R * 0.02), (FILLET1_R, FILLET1_R * 0.02))
            Line((FILLET1_R, FILLET1_R * 0.02), (FILLET1_R, 0))
        make_face()
    fillet1_piece_11b = extrude(amount=25.5, mode=Mode.PRIVATE)
    fillet1_piece_11b = split(fillet1_piece_11b, bisect_by=Plane(origin=(24, 28.520814657, 5.679185343), z_dir=(1, 0, 0)), keep=Keep.TOP, mode=Mode.PRIVATE)
    fillet1_piece_11 = fillet1_piece_11a & fillet1_piece_11b
    add(fillet1_piece_11)

    # Sketch11 → Cut-Extrude3 (cut)
    with BuildSketch(Plane.XY.offset(5)):
        with Locations((-11.136931804, 11.136931804)):
            Circle(SKETCH11_R)
        with Locations((11.136931804, 11.136931804)):
            Circle(SKETCH11_R)
        with Locations((-11.136931804, -11.136931804)):
            Circle(SKETCH11_R)
        with Locations((11.136931804, -11.136931804)):
            Circle(SKETCH11_R)
    extrude(amount=-CUT_EXTRUDE3_DEPTH, mode=Mode.SUBTRACT)


solid = Compound([body_2.part, body_3.part, part_1.part])
